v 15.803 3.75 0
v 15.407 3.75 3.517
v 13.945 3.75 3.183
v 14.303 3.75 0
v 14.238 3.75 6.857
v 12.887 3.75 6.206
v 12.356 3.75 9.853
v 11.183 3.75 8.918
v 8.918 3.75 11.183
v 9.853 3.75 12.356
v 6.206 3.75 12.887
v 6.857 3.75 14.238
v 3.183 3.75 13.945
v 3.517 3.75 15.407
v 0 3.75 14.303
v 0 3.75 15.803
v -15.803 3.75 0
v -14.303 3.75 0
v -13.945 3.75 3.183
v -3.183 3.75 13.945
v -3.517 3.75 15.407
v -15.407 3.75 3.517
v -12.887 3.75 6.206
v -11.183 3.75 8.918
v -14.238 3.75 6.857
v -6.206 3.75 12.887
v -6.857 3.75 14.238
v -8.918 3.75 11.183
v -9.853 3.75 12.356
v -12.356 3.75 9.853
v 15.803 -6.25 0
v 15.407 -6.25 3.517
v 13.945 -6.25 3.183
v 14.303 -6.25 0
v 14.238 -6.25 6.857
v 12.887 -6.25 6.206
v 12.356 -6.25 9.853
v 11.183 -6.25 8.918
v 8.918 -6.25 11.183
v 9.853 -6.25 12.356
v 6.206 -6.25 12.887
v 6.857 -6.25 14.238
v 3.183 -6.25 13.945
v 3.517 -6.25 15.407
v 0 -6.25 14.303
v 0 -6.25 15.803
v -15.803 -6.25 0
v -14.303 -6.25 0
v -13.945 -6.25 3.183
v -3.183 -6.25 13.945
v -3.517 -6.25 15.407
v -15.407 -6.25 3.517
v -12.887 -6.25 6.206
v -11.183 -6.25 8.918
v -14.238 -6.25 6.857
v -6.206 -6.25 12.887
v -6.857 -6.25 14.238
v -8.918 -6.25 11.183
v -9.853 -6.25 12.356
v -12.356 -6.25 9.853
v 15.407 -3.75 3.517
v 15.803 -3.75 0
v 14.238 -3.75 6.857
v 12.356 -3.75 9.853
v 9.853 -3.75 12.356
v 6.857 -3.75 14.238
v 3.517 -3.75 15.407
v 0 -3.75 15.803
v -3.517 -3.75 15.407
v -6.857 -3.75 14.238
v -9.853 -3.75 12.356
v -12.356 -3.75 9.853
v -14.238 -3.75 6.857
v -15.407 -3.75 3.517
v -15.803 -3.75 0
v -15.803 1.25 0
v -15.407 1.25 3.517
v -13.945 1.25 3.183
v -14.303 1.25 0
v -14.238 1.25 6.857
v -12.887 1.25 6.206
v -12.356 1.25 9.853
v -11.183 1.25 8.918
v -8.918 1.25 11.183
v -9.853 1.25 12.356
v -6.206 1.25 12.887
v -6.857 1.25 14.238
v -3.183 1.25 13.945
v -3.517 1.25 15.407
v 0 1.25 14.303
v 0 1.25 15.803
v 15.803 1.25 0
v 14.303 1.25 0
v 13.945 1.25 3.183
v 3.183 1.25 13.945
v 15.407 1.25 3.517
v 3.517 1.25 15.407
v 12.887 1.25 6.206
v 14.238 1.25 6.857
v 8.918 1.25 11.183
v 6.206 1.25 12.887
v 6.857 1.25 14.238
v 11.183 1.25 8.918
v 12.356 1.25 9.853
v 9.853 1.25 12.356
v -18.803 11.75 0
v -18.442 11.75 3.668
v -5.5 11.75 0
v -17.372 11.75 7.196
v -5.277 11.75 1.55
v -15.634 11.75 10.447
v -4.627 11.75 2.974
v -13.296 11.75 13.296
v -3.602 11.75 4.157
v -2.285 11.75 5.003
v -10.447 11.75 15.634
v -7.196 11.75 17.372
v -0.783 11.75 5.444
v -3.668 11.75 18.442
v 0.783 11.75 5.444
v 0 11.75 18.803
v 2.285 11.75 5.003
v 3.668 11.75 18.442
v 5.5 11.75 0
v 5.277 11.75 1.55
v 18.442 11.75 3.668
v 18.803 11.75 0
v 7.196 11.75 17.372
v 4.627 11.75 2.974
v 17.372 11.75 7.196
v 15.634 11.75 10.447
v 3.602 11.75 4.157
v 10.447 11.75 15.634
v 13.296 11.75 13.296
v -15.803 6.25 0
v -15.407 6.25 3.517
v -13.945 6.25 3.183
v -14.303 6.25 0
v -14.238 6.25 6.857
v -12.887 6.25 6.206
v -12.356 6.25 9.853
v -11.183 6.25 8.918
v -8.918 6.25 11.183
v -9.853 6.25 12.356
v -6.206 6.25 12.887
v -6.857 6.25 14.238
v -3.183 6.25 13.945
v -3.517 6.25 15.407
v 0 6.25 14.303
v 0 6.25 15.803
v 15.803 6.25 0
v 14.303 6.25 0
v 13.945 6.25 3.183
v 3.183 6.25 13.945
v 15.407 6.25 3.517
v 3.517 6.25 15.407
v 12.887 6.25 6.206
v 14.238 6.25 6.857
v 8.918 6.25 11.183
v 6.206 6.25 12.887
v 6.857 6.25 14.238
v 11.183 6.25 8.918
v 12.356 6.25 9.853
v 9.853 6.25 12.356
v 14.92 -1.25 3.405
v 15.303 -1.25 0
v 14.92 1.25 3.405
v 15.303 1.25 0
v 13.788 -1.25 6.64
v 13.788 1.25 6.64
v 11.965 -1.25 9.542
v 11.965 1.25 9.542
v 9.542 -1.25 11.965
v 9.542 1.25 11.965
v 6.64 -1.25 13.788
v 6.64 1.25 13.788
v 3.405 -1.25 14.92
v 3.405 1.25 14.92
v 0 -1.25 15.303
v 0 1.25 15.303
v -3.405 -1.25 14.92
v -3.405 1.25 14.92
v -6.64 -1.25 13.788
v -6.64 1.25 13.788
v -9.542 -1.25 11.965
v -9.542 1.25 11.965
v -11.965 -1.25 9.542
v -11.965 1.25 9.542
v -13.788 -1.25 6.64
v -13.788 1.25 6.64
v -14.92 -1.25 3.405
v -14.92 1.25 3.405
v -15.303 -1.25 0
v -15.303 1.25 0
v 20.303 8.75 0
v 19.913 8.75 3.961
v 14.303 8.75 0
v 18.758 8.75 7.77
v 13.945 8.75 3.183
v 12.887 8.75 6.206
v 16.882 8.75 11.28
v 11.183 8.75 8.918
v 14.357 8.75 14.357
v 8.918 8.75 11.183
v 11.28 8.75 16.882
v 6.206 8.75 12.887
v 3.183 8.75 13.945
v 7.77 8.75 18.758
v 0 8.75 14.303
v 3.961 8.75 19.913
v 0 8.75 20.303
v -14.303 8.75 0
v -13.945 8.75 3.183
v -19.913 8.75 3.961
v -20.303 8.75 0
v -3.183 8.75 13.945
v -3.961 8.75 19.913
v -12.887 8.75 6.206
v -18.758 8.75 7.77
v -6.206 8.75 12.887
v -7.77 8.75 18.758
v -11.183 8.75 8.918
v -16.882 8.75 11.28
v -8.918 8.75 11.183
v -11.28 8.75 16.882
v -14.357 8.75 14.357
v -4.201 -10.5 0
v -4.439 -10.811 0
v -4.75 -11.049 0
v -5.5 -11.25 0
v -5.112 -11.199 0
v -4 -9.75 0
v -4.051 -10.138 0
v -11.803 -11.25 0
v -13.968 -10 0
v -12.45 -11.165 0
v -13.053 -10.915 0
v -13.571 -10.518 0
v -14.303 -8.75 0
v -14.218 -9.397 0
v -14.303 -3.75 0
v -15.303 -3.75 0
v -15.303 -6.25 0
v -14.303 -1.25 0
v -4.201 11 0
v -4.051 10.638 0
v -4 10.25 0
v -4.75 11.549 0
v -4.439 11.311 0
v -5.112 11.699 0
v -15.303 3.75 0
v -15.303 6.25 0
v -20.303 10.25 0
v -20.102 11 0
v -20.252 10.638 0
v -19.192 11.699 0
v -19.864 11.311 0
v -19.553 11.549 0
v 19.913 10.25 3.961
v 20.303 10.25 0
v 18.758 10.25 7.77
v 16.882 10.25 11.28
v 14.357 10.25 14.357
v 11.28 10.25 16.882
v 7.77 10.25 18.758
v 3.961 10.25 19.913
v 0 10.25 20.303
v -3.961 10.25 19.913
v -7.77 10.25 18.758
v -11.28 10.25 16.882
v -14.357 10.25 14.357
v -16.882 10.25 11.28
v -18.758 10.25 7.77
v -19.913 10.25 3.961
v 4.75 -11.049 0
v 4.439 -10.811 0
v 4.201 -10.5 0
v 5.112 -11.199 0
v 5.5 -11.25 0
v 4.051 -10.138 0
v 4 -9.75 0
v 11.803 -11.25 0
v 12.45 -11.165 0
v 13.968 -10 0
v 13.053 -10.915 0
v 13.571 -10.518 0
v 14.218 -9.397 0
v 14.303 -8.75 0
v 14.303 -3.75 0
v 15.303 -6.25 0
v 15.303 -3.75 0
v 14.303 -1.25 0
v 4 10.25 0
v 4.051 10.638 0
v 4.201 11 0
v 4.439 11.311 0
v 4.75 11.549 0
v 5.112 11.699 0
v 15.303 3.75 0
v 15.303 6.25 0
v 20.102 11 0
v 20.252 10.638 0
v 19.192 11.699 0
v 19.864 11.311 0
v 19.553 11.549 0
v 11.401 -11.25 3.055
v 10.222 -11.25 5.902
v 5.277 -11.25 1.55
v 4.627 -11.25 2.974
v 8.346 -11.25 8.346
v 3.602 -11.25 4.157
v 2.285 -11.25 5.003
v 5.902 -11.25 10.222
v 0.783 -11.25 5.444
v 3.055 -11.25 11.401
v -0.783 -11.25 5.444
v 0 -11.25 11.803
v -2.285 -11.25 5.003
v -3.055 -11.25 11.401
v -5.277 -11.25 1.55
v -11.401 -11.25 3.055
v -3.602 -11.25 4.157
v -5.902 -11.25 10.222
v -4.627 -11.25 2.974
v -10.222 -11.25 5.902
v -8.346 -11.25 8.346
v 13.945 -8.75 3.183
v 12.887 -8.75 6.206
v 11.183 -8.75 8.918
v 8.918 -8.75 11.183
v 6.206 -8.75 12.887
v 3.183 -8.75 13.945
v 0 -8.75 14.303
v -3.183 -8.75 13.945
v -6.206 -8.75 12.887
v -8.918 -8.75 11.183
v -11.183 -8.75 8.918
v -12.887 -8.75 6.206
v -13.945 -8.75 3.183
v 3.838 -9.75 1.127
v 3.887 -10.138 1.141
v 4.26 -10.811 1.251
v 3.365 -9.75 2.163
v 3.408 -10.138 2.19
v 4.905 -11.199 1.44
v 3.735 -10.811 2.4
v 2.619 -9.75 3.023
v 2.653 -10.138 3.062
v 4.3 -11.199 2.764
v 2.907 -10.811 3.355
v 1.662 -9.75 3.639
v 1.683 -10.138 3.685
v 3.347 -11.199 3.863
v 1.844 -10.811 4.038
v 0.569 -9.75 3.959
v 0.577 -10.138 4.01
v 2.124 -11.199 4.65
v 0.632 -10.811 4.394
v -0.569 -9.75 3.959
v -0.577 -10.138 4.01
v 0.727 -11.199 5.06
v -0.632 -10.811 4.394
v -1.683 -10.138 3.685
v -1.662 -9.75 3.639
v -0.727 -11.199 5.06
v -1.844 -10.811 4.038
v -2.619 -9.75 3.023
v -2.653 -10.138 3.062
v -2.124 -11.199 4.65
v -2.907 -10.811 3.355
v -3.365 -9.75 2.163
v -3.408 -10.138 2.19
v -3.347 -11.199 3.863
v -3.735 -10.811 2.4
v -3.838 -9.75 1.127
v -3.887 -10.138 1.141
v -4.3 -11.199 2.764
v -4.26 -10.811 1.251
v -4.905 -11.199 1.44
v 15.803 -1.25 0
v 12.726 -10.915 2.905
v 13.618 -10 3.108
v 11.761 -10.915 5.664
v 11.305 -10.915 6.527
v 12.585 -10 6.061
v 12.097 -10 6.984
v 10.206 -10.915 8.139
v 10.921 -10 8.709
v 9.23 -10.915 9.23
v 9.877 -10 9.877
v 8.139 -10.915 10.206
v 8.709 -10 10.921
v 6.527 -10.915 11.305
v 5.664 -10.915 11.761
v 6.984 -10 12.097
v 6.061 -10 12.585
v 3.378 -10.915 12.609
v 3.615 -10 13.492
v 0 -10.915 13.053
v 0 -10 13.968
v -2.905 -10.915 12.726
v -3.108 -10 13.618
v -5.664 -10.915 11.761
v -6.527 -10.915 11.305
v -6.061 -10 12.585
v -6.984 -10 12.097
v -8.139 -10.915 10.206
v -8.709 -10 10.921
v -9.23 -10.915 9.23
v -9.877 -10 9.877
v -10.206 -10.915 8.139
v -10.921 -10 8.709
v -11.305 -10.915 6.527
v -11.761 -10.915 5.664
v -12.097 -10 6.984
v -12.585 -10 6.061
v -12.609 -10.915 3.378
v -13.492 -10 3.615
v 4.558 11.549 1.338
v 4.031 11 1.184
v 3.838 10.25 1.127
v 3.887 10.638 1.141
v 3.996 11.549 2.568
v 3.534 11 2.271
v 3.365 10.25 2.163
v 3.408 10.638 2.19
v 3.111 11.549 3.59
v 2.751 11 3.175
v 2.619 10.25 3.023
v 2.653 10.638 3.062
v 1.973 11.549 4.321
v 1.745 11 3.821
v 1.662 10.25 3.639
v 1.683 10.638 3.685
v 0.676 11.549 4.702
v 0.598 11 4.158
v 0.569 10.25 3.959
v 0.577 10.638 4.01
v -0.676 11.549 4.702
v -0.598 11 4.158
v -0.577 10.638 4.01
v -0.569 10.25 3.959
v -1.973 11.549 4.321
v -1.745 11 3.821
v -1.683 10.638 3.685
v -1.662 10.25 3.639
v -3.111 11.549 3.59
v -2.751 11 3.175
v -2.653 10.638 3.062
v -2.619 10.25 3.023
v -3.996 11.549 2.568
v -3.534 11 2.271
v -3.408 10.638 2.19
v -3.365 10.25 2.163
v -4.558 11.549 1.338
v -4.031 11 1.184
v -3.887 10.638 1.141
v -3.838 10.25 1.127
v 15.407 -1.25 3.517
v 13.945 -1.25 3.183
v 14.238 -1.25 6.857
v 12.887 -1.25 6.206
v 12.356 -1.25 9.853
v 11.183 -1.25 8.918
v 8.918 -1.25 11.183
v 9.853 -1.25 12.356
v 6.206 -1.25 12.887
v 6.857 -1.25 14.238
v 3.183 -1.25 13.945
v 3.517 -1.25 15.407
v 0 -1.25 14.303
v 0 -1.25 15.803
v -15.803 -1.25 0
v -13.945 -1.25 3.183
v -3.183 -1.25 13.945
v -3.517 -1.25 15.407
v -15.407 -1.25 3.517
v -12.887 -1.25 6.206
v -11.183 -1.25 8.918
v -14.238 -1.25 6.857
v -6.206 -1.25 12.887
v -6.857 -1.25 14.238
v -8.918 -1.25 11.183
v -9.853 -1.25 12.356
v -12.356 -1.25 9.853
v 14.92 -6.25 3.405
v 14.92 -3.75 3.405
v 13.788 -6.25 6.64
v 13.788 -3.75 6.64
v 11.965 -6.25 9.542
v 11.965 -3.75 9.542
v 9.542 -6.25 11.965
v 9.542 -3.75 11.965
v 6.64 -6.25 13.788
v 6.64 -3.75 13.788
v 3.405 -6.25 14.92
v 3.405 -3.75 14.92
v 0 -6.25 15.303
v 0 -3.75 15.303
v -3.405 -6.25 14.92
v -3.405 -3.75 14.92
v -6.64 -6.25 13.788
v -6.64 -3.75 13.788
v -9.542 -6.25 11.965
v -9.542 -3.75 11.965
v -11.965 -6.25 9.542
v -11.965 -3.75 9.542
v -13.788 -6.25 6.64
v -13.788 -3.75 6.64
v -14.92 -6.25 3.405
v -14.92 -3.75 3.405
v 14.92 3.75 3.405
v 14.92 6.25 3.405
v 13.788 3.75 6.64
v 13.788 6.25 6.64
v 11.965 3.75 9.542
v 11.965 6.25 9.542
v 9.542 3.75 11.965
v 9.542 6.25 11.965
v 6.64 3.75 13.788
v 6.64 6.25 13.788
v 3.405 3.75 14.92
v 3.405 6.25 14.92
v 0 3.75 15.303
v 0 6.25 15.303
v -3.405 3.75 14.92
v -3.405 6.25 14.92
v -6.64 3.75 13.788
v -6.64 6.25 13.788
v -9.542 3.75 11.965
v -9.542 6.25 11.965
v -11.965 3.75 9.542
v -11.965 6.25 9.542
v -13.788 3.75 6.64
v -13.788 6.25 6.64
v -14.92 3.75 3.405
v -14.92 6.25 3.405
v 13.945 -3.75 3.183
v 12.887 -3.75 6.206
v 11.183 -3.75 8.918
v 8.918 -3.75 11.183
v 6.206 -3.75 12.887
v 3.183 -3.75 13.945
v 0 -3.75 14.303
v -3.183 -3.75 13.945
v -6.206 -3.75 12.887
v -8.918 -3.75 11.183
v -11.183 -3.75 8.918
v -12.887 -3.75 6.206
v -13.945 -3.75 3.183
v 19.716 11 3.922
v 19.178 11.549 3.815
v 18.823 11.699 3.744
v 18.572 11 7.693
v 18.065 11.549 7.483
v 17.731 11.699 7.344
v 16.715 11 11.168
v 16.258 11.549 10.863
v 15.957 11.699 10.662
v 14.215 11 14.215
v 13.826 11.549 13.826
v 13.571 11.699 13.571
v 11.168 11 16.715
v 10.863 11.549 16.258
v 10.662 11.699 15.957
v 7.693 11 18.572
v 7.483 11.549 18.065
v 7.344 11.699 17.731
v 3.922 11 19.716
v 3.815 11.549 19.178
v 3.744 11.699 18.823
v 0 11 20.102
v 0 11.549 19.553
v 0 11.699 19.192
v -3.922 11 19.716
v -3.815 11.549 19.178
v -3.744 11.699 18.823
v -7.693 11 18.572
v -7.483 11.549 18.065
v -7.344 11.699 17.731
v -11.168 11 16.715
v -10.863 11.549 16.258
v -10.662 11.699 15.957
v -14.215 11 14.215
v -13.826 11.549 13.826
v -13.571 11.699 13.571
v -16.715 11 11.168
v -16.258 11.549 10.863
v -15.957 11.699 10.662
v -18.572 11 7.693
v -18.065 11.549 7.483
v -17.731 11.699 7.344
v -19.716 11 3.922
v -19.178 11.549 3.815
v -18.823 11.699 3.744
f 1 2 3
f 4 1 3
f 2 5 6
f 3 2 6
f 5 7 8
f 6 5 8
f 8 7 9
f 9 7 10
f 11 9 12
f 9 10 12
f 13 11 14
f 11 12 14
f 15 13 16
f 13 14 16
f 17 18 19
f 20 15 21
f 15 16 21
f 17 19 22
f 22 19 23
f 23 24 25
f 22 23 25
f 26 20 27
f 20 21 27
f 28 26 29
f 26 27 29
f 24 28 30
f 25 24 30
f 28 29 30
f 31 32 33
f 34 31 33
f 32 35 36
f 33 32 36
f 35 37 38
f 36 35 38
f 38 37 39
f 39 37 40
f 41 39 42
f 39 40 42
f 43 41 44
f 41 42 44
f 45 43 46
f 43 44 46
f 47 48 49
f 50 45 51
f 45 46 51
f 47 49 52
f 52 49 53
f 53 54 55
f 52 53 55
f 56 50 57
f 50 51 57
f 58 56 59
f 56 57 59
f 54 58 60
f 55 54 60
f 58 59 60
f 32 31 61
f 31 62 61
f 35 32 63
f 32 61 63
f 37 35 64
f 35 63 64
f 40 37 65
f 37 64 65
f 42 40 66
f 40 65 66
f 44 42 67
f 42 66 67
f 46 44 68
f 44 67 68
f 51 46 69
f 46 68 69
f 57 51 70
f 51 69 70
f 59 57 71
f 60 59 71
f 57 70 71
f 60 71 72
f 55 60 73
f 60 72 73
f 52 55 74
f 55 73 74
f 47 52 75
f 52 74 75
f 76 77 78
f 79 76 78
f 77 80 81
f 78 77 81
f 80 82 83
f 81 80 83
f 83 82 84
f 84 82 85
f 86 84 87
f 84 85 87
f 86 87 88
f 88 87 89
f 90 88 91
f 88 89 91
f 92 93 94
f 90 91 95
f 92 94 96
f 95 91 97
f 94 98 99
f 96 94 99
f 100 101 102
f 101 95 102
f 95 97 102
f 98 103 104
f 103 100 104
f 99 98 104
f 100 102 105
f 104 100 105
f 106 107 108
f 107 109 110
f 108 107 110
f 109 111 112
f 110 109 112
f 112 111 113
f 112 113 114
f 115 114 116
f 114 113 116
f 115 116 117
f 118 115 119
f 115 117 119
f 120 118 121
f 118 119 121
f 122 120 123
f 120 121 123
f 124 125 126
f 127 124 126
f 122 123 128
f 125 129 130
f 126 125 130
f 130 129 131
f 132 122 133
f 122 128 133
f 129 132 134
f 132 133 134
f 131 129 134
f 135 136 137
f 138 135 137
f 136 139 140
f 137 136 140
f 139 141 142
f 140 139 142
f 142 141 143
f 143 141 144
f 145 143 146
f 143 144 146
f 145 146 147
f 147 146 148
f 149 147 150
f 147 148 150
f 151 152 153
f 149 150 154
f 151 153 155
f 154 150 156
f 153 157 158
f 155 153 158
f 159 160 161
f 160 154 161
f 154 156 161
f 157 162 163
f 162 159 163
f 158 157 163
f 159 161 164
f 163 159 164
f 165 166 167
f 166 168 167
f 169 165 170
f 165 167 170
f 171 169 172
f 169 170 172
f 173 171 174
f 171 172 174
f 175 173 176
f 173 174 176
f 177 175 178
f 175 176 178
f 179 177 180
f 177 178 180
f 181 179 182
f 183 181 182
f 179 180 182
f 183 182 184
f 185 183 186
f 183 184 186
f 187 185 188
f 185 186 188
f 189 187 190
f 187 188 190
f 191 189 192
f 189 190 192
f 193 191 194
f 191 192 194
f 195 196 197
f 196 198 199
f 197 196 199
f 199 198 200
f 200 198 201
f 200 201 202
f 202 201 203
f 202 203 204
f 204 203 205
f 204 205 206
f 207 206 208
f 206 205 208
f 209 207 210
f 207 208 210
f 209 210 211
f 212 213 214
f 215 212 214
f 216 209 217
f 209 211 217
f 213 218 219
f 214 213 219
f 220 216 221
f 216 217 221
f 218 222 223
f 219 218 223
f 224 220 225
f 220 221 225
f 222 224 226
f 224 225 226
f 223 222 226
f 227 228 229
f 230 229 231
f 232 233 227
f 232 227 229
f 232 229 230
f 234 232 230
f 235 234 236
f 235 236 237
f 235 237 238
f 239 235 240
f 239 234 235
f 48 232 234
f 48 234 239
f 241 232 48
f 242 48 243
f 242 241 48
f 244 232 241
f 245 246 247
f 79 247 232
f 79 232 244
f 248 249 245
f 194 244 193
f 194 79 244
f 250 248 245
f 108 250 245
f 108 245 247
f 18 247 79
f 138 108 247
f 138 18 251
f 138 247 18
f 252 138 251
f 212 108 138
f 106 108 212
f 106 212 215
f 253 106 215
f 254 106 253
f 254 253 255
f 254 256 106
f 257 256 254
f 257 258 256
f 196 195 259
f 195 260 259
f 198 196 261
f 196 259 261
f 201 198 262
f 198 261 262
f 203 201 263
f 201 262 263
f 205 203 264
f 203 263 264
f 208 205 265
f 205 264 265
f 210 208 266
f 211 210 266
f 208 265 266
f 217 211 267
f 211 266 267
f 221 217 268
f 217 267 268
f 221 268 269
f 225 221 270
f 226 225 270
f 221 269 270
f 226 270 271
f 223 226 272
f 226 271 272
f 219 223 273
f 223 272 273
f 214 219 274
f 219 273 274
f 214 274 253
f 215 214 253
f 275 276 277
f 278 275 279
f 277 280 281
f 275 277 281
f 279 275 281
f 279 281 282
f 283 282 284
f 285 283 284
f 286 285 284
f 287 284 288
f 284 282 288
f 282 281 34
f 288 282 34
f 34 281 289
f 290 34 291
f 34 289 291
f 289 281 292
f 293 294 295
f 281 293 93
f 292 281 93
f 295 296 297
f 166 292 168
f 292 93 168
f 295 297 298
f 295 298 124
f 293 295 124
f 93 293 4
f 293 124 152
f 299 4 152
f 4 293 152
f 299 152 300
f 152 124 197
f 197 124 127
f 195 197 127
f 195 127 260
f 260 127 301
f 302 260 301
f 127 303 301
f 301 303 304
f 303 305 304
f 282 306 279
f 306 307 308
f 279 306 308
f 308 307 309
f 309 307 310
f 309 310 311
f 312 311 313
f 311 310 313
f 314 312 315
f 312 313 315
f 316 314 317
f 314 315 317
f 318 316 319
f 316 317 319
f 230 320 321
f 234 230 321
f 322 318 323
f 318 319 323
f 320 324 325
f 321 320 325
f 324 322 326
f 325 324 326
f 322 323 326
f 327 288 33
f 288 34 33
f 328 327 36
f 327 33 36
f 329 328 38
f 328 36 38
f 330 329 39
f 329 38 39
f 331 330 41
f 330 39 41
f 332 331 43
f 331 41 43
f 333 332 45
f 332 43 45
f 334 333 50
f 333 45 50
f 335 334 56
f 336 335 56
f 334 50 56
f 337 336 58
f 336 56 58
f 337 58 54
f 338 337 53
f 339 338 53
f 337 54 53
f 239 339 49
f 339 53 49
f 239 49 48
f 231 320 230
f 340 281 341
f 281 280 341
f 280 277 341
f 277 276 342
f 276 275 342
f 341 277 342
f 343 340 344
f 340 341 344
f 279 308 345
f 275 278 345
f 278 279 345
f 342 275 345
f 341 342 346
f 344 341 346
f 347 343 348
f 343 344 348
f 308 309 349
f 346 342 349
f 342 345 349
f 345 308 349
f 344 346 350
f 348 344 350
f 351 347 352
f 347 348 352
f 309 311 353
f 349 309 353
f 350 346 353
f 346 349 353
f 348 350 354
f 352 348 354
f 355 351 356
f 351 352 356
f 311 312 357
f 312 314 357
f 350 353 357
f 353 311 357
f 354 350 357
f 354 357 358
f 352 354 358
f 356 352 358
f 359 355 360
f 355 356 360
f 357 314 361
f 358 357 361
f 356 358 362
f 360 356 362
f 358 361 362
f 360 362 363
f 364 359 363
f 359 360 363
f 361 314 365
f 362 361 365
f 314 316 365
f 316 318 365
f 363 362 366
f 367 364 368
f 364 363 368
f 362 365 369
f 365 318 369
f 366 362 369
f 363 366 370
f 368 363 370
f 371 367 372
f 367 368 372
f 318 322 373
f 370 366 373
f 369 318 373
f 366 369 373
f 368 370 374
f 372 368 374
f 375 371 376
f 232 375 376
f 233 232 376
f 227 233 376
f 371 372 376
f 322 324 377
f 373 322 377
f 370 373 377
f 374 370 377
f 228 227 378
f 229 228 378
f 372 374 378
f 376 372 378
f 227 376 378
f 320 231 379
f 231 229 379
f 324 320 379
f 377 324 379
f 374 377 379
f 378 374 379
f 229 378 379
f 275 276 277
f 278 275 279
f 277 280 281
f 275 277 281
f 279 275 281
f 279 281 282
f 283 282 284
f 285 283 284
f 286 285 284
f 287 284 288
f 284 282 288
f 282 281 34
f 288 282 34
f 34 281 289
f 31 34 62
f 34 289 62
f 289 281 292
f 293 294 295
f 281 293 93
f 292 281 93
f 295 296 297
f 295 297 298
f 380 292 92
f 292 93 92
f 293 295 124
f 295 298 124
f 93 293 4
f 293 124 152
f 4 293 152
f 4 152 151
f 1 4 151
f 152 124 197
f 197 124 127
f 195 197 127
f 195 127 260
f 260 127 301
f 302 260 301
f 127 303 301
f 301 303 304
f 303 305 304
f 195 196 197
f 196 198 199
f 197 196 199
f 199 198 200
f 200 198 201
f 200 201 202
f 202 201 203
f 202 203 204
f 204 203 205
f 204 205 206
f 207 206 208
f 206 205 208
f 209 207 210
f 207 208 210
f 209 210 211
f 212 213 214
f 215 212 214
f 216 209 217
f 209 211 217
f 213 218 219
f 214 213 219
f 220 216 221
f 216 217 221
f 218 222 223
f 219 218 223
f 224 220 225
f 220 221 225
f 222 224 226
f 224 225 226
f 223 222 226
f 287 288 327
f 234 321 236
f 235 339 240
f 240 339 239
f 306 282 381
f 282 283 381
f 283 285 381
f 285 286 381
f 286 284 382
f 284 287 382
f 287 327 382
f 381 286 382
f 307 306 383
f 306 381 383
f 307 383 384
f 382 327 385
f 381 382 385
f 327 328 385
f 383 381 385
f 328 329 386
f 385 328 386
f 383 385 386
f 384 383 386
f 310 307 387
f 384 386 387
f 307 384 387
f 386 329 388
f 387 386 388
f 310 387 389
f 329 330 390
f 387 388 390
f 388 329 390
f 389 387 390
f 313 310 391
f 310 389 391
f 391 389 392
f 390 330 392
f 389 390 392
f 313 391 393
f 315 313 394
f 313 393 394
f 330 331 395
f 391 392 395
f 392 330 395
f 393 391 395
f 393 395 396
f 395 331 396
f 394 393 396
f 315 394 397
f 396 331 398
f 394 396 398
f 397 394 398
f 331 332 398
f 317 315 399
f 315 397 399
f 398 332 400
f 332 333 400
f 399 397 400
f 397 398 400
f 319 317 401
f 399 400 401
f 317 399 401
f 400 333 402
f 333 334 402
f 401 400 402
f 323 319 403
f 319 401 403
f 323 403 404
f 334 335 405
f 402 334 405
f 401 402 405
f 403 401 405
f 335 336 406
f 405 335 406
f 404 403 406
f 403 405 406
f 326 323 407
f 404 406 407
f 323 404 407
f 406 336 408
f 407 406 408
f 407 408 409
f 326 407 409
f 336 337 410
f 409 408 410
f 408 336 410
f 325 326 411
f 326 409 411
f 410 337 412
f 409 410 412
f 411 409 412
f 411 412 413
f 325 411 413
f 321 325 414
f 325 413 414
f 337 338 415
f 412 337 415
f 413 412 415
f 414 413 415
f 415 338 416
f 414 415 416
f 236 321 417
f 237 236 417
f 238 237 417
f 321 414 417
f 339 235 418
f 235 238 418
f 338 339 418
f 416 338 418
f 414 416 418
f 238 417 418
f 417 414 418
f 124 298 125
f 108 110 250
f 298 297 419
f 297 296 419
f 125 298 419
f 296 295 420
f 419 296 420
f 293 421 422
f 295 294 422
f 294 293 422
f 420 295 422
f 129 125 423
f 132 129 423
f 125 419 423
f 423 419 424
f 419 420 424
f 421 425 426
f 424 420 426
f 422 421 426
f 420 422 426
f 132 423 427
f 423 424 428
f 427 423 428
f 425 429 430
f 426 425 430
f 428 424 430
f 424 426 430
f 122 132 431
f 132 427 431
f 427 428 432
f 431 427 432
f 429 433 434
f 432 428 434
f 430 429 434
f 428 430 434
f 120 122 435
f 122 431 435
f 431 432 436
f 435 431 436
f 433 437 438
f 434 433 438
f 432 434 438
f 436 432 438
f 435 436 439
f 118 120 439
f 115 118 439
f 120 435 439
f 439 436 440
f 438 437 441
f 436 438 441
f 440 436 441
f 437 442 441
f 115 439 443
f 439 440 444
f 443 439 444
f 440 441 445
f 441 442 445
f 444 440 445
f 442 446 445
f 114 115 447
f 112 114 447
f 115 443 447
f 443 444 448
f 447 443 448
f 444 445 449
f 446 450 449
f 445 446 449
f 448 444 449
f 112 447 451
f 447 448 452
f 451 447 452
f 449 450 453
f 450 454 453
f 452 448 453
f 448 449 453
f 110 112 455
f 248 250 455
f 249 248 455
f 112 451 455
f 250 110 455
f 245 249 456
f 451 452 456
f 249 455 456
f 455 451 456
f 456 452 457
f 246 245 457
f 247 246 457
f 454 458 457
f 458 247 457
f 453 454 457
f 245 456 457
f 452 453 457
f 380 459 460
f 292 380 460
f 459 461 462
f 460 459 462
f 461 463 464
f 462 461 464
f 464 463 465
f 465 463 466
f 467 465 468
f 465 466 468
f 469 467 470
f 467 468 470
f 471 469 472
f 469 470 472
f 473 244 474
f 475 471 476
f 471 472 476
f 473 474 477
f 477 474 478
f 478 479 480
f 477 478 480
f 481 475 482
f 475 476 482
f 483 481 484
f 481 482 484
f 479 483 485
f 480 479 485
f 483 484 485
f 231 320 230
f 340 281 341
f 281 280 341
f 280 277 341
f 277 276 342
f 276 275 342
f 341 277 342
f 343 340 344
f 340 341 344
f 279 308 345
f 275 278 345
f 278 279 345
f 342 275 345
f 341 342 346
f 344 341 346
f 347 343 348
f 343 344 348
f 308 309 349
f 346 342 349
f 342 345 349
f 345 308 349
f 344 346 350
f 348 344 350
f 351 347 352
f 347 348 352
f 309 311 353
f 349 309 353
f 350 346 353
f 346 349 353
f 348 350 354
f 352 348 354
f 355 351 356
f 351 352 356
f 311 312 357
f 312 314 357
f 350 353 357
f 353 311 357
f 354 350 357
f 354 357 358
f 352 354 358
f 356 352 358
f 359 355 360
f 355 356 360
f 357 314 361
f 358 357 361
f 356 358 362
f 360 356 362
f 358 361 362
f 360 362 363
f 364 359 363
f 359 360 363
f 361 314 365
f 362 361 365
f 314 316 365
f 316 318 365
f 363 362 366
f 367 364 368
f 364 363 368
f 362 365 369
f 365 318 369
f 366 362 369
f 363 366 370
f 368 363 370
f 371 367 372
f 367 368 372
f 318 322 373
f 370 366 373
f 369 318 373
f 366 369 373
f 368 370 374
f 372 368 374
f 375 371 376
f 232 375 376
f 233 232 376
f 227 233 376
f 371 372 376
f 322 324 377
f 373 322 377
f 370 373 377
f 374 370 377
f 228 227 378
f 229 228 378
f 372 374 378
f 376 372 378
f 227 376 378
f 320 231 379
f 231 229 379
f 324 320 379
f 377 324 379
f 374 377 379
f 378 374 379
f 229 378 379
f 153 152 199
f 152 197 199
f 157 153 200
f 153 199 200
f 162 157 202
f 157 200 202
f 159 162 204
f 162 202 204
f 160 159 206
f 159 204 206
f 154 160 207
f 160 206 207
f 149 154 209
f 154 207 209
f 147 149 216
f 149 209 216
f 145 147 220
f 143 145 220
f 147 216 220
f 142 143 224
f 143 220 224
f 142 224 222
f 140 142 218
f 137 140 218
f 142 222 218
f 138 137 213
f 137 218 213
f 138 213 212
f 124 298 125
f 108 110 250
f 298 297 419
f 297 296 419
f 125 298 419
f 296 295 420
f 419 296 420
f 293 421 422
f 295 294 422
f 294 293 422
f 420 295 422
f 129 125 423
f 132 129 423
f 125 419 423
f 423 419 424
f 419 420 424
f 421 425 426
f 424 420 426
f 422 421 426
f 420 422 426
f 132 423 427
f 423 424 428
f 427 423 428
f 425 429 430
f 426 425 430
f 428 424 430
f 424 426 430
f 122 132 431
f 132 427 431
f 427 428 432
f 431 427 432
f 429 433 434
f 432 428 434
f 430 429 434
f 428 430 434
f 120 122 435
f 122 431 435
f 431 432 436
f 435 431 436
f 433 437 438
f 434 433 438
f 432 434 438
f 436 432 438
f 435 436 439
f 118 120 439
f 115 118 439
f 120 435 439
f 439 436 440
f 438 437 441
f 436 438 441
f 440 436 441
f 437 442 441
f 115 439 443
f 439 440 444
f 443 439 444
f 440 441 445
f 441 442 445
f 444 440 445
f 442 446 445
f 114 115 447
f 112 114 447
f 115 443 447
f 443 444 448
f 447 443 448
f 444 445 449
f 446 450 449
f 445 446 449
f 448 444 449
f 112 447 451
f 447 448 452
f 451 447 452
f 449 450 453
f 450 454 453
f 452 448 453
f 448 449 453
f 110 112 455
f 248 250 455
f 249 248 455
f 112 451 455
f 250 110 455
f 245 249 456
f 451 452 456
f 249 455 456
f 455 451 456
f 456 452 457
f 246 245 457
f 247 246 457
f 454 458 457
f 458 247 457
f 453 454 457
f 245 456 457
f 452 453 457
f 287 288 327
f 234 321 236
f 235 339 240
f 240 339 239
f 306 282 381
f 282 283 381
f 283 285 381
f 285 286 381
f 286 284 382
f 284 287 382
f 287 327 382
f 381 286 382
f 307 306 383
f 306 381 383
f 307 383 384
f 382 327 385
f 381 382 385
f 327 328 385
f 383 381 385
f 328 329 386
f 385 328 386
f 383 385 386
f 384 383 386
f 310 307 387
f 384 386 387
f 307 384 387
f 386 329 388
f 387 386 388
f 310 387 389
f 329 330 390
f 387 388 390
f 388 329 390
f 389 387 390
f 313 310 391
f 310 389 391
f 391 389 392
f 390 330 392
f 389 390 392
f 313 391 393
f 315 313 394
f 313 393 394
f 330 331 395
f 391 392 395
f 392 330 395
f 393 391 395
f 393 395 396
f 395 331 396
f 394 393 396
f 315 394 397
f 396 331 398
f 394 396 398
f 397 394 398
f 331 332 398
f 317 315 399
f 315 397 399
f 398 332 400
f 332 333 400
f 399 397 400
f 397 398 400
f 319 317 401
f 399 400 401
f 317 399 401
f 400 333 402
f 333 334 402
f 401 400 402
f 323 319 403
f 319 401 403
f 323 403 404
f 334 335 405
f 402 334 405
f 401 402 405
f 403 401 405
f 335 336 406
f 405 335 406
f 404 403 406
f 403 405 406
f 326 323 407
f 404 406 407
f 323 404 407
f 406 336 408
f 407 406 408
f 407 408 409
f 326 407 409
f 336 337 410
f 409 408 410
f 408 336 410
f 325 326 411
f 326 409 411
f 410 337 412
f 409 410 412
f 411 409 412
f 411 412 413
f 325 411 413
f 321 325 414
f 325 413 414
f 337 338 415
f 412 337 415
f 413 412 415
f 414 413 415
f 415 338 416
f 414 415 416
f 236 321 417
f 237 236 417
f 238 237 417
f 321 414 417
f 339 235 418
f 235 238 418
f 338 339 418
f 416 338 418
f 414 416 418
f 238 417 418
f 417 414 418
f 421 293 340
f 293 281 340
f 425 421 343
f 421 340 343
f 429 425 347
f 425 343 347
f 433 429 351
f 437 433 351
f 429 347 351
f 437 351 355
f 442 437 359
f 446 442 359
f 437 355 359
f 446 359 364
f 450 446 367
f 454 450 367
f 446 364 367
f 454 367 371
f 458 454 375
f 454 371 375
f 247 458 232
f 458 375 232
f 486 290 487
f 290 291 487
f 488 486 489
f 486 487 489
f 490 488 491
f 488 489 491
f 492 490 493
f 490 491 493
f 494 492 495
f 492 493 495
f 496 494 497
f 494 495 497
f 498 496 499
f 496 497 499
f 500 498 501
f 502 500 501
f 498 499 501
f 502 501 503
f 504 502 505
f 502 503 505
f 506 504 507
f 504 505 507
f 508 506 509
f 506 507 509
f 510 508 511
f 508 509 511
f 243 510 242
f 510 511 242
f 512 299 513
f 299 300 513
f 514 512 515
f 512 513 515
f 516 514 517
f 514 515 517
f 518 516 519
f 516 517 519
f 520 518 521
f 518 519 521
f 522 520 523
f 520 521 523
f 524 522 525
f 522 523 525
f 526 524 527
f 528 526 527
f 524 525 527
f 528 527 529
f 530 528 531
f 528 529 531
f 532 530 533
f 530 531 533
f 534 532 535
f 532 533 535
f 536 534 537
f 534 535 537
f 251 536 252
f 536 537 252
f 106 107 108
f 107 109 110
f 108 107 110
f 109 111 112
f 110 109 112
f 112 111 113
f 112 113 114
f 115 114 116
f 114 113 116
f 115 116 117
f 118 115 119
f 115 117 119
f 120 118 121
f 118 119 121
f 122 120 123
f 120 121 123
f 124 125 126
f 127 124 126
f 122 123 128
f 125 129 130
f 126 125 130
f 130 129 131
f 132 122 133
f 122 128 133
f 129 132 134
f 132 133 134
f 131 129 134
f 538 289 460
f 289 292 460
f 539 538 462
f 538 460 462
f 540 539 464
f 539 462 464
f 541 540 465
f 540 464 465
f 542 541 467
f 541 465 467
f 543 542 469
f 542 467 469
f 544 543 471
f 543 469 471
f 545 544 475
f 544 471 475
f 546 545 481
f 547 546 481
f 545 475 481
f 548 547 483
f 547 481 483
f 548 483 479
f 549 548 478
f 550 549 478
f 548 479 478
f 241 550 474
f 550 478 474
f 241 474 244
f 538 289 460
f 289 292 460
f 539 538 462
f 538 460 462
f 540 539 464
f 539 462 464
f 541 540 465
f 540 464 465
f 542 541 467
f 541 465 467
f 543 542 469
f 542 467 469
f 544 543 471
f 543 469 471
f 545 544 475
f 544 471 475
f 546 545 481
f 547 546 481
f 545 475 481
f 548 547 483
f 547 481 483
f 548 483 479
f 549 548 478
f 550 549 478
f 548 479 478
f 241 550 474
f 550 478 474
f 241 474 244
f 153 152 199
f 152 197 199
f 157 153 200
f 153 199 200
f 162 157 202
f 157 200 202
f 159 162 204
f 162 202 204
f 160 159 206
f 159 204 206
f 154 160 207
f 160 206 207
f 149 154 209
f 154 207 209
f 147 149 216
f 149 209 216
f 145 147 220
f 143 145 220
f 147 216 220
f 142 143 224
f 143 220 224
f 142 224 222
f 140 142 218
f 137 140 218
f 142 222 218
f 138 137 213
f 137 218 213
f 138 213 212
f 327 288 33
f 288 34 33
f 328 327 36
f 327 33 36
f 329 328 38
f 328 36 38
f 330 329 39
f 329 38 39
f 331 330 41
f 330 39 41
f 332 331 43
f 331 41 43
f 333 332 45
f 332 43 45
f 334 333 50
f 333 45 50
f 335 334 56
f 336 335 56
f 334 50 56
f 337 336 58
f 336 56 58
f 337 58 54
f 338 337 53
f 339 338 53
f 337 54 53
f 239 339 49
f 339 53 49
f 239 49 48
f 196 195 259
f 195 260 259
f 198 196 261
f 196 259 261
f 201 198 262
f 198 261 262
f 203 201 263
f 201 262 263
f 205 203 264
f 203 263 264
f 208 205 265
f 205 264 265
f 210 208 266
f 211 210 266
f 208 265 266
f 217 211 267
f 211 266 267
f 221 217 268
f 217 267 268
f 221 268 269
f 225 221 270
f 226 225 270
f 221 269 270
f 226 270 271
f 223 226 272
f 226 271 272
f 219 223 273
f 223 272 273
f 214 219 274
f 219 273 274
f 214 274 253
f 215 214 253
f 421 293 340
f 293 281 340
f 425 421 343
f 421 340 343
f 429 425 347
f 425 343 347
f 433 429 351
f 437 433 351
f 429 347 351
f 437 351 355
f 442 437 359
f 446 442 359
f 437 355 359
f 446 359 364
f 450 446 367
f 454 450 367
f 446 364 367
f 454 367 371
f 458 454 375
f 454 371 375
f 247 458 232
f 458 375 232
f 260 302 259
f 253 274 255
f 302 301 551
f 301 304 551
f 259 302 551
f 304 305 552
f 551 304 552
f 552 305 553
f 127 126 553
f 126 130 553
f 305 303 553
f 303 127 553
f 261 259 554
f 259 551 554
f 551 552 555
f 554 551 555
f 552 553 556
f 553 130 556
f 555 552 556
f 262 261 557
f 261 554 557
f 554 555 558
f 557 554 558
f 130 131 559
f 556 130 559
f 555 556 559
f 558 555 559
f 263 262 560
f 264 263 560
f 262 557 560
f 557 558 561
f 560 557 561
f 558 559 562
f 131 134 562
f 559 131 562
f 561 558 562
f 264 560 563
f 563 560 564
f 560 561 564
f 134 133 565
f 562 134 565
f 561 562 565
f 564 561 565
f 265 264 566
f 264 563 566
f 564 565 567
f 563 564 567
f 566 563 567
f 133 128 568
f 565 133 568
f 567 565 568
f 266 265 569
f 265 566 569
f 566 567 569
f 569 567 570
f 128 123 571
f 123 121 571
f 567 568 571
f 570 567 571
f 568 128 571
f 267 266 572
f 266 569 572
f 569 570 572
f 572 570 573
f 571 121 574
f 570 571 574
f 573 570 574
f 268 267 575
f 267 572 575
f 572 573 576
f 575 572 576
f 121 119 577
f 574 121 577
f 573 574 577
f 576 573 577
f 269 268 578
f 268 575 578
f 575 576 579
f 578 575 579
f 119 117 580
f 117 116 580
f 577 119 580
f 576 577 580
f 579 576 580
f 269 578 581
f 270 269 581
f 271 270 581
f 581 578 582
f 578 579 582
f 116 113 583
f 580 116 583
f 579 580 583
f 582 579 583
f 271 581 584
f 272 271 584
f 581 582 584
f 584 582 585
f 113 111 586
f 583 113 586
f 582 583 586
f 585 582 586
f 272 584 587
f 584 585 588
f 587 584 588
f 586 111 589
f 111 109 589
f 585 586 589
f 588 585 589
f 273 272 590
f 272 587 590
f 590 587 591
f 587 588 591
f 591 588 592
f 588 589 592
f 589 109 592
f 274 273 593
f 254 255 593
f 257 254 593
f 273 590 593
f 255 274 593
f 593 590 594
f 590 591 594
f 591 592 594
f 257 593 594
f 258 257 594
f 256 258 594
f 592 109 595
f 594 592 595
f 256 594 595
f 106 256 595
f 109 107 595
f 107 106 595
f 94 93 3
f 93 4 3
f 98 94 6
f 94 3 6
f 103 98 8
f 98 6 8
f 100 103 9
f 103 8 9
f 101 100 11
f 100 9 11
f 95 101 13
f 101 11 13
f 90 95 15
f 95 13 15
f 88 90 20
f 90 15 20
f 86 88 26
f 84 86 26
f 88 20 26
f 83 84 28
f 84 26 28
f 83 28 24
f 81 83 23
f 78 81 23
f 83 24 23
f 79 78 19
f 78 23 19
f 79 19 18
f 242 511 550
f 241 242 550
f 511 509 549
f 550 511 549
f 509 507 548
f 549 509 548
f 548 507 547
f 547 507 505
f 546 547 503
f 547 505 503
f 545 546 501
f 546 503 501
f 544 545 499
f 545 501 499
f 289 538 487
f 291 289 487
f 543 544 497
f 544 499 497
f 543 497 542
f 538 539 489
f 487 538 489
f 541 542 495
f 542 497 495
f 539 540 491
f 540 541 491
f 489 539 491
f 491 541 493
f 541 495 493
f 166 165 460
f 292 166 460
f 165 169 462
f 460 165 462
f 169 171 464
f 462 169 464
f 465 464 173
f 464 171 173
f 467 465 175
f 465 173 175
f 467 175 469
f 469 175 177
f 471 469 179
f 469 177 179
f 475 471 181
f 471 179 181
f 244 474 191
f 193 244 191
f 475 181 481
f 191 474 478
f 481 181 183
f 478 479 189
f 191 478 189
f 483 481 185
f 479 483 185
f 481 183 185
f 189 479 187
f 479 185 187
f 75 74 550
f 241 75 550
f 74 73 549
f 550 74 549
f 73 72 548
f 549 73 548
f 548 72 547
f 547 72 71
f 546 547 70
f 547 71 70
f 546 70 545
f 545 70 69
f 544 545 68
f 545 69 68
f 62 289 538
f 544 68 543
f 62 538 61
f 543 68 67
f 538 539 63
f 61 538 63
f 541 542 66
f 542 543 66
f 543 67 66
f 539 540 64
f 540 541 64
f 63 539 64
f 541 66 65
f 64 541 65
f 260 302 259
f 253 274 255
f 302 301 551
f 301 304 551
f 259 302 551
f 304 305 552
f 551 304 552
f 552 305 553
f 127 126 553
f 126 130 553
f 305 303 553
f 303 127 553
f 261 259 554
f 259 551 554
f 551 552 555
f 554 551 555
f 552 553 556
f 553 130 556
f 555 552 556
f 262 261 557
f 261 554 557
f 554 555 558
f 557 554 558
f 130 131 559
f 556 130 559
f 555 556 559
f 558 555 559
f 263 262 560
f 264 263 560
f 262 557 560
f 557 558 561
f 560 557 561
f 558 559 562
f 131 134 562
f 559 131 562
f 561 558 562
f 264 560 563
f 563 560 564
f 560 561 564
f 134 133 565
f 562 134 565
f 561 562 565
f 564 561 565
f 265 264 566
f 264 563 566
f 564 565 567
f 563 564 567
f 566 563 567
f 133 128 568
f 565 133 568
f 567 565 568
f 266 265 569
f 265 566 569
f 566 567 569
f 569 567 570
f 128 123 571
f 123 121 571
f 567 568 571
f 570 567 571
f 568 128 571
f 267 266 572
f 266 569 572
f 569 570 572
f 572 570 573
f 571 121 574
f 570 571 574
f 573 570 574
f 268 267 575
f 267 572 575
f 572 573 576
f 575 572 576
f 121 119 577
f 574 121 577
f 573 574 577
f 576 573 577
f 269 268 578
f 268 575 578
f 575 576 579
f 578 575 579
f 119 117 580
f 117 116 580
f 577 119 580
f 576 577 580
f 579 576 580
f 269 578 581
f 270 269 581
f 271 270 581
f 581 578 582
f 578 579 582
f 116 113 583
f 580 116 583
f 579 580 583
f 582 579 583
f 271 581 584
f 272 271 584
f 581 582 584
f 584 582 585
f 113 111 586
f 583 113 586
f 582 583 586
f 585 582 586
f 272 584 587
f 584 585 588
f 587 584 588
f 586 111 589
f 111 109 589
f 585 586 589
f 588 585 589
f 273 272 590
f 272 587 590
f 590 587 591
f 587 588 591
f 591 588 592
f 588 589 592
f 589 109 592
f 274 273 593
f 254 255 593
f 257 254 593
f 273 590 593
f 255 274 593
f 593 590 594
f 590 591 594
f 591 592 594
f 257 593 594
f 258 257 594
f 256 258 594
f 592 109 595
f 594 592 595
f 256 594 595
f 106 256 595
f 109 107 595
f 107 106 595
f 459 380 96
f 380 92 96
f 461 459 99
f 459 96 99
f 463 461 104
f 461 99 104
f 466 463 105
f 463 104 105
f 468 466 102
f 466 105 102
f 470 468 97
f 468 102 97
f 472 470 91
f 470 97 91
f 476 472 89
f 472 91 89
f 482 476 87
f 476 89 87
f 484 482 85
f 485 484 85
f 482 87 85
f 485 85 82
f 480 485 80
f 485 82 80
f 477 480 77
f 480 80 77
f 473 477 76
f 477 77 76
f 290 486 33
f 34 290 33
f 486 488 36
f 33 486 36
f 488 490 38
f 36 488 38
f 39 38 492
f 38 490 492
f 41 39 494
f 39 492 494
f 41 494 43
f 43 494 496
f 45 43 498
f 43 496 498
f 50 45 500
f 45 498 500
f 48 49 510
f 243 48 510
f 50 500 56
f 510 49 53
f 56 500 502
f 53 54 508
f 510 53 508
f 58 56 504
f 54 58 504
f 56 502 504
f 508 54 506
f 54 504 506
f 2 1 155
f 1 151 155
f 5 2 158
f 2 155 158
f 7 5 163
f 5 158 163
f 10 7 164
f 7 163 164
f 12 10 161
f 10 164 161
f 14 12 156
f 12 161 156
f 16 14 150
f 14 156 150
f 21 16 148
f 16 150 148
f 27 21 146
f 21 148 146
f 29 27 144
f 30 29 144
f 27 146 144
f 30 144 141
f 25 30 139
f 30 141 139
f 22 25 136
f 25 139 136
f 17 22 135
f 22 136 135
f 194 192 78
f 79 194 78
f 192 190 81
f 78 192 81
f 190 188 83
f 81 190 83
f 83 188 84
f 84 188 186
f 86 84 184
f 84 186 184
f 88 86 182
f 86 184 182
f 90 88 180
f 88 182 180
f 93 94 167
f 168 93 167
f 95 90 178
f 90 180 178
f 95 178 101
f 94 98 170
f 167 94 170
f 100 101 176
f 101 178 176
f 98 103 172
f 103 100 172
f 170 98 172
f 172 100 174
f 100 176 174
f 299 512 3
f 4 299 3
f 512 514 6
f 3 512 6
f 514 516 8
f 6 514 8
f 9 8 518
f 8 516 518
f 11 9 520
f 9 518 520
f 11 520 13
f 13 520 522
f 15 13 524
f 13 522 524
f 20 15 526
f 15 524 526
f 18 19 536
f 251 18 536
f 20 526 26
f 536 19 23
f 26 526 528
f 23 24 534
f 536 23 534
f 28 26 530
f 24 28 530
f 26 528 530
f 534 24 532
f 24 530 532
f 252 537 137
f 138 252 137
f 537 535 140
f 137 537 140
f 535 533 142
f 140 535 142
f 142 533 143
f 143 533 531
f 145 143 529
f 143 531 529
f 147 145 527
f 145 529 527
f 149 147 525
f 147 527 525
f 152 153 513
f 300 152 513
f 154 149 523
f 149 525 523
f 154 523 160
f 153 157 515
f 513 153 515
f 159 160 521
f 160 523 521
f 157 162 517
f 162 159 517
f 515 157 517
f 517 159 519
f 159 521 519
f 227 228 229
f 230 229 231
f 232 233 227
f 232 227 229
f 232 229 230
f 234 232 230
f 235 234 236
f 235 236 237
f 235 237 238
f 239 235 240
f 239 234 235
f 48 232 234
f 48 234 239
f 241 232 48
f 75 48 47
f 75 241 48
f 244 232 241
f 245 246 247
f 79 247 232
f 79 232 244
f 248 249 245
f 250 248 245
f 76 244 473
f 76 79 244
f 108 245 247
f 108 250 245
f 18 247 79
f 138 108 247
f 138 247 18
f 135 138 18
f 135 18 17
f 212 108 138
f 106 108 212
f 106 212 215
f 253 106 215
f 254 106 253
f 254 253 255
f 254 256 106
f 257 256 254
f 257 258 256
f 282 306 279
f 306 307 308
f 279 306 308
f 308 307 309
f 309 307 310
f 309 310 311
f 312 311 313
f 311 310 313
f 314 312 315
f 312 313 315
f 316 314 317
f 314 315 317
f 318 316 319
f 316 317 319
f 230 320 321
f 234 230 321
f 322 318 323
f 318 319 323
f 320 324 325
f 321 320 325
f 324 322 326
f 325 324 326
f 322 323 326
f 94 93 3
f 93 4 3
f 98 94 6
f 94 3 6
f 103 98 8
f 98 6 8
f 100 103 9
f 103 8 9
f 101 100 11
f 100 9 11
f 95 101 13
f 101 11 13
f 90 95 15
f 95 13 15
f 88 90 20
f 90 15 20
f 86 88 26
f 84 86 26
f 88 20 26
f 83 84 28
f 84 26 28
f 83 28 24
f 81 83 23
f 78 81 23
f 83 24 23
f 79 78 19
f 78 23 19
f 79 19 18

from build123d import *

# Parameters (mm, degrees)
REVOLUTION_ANGLE    = -180
REVOLUTION001_ANGLE = -180


with BuildPart() as half_cable_stopper:
    # Sketch → Revolution (revolve)
    with BuildSketch(Plane.XY):
        with BuildLine():
            Line((4, 10.25), (4, -9.75))
            ThreePointArc((4, -9.75), (4.43934, -10.81066), (5.5, -11.25))
            Line((5.5, -11.25), (11.8034, -11.25))
            ThreePointArc((11.8034, -11.25), (13.571167, -10.517767), (14.3034, -8.75))
            Line((14.3034, -8.75), (14.3034, -6.25))
            Line((14.3034, -6.25), (15.3034, -6.25))
            Line((15.3034, -6.25), (15.3034, -3.75))
            Line((15.3034, -3.75), (14.3034, -3.75))
            Line((14.3034, -3.75), (14.3034, -1.25))
            Line((14.3034, -1.25), (15.3034, -1.25))
            Line((15.3034, -1.25), (15.3034, 1.25))
            Line((15.3034, 1.25), (14.3034, 1.25))
            Line((14.3034, 1.25), (14.3034, 3.75))
            Line((14.3034, 3.75), (15.3034, 3.75))
            Line((15.3034, 3.75), (15.3034, 6.25))
            Line((15.3034, 6.25), (14.3034, 6.25))
            Line((14.3034, 6.25), (14.3034, 8.75))
            Line((14.3034, 8.75), (20.3034, 8.75))
            Line((20.3034, 8.75), (20.3034, 10.25))
            ThreePointArc((20.3034, 10.25), (19.86406, 11.31066), (18.8034, 11.75))
            Line((18.8034, 11.75), (5.5, 11.75))
            ThreePointArc((5.5, 11.75), (4.43934, 11.31066), (4, 10.25))
        make_face()
    revolve(axis=Axis((0, 0, 0), (0, 1, 0)), revolution_arc=REVOLUTION_ANGLE)


with BuildPart() as half_cable_stopper_wide:
    # Sketch001 → Revolution001 (revolve)
    with BuildSketch(Plane.XY):
        with BuildLine():
            Line((4, 10.25), (4, -9.75))
            ThreePointArc((4, -9.75), (4.43934, -10.81066), (5.5, -11.25))
            Line((5.5, -11.25), (11.8034, -11.25))
            ThreePointArc((11.8034, -11.25), (13.571167, -10.517767), (14.3034, -8.75))
            Line((14.3034, -8.75), (14.3034, -6.25))
            Line((14.3034, -6.25), (15.8034, -6.25))
            Line((15.8034, -6.25), (15.8034, -3.75))
            Line((15.8034, -3.75), (14.3034, -3.75))
            Line((14.3034, -3.75), (14.3034, -1.25))
            Line((14.3034, -1.25), (15.8034, -1.25))
            Line((15.8034, -1.25), (15.8034, 1.25))
            Line((15.8034, 1.25), (14.3034, 1.25))
            Line((14.3034, 1.25), (14.3034, 3.75))
            Line((14.3034, 3.75), (15.8034, 3.75))
            Line((15.8034, 3.75), (15.8034, 6.25))
            Line((15.8034, 6.25), (14.3034, 6.25))
            Line((14.3034, 6.25), (14.3034, 8.75))
            Line((14.3034, 8.75), (20.3034, 8.75))
            Line((20.3034, 8.75), (20.3034, 10.25))
            ThreePointArc((20.3034, 10.25), (19.86406, 11.31066), (18.8034, 11.75))
            Line((18.8034, 11.75), (5.5, 11.75))
            ThreePointArc((5.5, 11.75), (4.43934, 11.31066), (4, 10.25))
        make_face()
    revolve(axis=Axis((0, 0, 0), (0, 1, 0)), revolution_arc=REVOLUTION001_ANGLE)


solid = Compound([half_cable_stopper.part, half_cable_stopper_wide.part])
